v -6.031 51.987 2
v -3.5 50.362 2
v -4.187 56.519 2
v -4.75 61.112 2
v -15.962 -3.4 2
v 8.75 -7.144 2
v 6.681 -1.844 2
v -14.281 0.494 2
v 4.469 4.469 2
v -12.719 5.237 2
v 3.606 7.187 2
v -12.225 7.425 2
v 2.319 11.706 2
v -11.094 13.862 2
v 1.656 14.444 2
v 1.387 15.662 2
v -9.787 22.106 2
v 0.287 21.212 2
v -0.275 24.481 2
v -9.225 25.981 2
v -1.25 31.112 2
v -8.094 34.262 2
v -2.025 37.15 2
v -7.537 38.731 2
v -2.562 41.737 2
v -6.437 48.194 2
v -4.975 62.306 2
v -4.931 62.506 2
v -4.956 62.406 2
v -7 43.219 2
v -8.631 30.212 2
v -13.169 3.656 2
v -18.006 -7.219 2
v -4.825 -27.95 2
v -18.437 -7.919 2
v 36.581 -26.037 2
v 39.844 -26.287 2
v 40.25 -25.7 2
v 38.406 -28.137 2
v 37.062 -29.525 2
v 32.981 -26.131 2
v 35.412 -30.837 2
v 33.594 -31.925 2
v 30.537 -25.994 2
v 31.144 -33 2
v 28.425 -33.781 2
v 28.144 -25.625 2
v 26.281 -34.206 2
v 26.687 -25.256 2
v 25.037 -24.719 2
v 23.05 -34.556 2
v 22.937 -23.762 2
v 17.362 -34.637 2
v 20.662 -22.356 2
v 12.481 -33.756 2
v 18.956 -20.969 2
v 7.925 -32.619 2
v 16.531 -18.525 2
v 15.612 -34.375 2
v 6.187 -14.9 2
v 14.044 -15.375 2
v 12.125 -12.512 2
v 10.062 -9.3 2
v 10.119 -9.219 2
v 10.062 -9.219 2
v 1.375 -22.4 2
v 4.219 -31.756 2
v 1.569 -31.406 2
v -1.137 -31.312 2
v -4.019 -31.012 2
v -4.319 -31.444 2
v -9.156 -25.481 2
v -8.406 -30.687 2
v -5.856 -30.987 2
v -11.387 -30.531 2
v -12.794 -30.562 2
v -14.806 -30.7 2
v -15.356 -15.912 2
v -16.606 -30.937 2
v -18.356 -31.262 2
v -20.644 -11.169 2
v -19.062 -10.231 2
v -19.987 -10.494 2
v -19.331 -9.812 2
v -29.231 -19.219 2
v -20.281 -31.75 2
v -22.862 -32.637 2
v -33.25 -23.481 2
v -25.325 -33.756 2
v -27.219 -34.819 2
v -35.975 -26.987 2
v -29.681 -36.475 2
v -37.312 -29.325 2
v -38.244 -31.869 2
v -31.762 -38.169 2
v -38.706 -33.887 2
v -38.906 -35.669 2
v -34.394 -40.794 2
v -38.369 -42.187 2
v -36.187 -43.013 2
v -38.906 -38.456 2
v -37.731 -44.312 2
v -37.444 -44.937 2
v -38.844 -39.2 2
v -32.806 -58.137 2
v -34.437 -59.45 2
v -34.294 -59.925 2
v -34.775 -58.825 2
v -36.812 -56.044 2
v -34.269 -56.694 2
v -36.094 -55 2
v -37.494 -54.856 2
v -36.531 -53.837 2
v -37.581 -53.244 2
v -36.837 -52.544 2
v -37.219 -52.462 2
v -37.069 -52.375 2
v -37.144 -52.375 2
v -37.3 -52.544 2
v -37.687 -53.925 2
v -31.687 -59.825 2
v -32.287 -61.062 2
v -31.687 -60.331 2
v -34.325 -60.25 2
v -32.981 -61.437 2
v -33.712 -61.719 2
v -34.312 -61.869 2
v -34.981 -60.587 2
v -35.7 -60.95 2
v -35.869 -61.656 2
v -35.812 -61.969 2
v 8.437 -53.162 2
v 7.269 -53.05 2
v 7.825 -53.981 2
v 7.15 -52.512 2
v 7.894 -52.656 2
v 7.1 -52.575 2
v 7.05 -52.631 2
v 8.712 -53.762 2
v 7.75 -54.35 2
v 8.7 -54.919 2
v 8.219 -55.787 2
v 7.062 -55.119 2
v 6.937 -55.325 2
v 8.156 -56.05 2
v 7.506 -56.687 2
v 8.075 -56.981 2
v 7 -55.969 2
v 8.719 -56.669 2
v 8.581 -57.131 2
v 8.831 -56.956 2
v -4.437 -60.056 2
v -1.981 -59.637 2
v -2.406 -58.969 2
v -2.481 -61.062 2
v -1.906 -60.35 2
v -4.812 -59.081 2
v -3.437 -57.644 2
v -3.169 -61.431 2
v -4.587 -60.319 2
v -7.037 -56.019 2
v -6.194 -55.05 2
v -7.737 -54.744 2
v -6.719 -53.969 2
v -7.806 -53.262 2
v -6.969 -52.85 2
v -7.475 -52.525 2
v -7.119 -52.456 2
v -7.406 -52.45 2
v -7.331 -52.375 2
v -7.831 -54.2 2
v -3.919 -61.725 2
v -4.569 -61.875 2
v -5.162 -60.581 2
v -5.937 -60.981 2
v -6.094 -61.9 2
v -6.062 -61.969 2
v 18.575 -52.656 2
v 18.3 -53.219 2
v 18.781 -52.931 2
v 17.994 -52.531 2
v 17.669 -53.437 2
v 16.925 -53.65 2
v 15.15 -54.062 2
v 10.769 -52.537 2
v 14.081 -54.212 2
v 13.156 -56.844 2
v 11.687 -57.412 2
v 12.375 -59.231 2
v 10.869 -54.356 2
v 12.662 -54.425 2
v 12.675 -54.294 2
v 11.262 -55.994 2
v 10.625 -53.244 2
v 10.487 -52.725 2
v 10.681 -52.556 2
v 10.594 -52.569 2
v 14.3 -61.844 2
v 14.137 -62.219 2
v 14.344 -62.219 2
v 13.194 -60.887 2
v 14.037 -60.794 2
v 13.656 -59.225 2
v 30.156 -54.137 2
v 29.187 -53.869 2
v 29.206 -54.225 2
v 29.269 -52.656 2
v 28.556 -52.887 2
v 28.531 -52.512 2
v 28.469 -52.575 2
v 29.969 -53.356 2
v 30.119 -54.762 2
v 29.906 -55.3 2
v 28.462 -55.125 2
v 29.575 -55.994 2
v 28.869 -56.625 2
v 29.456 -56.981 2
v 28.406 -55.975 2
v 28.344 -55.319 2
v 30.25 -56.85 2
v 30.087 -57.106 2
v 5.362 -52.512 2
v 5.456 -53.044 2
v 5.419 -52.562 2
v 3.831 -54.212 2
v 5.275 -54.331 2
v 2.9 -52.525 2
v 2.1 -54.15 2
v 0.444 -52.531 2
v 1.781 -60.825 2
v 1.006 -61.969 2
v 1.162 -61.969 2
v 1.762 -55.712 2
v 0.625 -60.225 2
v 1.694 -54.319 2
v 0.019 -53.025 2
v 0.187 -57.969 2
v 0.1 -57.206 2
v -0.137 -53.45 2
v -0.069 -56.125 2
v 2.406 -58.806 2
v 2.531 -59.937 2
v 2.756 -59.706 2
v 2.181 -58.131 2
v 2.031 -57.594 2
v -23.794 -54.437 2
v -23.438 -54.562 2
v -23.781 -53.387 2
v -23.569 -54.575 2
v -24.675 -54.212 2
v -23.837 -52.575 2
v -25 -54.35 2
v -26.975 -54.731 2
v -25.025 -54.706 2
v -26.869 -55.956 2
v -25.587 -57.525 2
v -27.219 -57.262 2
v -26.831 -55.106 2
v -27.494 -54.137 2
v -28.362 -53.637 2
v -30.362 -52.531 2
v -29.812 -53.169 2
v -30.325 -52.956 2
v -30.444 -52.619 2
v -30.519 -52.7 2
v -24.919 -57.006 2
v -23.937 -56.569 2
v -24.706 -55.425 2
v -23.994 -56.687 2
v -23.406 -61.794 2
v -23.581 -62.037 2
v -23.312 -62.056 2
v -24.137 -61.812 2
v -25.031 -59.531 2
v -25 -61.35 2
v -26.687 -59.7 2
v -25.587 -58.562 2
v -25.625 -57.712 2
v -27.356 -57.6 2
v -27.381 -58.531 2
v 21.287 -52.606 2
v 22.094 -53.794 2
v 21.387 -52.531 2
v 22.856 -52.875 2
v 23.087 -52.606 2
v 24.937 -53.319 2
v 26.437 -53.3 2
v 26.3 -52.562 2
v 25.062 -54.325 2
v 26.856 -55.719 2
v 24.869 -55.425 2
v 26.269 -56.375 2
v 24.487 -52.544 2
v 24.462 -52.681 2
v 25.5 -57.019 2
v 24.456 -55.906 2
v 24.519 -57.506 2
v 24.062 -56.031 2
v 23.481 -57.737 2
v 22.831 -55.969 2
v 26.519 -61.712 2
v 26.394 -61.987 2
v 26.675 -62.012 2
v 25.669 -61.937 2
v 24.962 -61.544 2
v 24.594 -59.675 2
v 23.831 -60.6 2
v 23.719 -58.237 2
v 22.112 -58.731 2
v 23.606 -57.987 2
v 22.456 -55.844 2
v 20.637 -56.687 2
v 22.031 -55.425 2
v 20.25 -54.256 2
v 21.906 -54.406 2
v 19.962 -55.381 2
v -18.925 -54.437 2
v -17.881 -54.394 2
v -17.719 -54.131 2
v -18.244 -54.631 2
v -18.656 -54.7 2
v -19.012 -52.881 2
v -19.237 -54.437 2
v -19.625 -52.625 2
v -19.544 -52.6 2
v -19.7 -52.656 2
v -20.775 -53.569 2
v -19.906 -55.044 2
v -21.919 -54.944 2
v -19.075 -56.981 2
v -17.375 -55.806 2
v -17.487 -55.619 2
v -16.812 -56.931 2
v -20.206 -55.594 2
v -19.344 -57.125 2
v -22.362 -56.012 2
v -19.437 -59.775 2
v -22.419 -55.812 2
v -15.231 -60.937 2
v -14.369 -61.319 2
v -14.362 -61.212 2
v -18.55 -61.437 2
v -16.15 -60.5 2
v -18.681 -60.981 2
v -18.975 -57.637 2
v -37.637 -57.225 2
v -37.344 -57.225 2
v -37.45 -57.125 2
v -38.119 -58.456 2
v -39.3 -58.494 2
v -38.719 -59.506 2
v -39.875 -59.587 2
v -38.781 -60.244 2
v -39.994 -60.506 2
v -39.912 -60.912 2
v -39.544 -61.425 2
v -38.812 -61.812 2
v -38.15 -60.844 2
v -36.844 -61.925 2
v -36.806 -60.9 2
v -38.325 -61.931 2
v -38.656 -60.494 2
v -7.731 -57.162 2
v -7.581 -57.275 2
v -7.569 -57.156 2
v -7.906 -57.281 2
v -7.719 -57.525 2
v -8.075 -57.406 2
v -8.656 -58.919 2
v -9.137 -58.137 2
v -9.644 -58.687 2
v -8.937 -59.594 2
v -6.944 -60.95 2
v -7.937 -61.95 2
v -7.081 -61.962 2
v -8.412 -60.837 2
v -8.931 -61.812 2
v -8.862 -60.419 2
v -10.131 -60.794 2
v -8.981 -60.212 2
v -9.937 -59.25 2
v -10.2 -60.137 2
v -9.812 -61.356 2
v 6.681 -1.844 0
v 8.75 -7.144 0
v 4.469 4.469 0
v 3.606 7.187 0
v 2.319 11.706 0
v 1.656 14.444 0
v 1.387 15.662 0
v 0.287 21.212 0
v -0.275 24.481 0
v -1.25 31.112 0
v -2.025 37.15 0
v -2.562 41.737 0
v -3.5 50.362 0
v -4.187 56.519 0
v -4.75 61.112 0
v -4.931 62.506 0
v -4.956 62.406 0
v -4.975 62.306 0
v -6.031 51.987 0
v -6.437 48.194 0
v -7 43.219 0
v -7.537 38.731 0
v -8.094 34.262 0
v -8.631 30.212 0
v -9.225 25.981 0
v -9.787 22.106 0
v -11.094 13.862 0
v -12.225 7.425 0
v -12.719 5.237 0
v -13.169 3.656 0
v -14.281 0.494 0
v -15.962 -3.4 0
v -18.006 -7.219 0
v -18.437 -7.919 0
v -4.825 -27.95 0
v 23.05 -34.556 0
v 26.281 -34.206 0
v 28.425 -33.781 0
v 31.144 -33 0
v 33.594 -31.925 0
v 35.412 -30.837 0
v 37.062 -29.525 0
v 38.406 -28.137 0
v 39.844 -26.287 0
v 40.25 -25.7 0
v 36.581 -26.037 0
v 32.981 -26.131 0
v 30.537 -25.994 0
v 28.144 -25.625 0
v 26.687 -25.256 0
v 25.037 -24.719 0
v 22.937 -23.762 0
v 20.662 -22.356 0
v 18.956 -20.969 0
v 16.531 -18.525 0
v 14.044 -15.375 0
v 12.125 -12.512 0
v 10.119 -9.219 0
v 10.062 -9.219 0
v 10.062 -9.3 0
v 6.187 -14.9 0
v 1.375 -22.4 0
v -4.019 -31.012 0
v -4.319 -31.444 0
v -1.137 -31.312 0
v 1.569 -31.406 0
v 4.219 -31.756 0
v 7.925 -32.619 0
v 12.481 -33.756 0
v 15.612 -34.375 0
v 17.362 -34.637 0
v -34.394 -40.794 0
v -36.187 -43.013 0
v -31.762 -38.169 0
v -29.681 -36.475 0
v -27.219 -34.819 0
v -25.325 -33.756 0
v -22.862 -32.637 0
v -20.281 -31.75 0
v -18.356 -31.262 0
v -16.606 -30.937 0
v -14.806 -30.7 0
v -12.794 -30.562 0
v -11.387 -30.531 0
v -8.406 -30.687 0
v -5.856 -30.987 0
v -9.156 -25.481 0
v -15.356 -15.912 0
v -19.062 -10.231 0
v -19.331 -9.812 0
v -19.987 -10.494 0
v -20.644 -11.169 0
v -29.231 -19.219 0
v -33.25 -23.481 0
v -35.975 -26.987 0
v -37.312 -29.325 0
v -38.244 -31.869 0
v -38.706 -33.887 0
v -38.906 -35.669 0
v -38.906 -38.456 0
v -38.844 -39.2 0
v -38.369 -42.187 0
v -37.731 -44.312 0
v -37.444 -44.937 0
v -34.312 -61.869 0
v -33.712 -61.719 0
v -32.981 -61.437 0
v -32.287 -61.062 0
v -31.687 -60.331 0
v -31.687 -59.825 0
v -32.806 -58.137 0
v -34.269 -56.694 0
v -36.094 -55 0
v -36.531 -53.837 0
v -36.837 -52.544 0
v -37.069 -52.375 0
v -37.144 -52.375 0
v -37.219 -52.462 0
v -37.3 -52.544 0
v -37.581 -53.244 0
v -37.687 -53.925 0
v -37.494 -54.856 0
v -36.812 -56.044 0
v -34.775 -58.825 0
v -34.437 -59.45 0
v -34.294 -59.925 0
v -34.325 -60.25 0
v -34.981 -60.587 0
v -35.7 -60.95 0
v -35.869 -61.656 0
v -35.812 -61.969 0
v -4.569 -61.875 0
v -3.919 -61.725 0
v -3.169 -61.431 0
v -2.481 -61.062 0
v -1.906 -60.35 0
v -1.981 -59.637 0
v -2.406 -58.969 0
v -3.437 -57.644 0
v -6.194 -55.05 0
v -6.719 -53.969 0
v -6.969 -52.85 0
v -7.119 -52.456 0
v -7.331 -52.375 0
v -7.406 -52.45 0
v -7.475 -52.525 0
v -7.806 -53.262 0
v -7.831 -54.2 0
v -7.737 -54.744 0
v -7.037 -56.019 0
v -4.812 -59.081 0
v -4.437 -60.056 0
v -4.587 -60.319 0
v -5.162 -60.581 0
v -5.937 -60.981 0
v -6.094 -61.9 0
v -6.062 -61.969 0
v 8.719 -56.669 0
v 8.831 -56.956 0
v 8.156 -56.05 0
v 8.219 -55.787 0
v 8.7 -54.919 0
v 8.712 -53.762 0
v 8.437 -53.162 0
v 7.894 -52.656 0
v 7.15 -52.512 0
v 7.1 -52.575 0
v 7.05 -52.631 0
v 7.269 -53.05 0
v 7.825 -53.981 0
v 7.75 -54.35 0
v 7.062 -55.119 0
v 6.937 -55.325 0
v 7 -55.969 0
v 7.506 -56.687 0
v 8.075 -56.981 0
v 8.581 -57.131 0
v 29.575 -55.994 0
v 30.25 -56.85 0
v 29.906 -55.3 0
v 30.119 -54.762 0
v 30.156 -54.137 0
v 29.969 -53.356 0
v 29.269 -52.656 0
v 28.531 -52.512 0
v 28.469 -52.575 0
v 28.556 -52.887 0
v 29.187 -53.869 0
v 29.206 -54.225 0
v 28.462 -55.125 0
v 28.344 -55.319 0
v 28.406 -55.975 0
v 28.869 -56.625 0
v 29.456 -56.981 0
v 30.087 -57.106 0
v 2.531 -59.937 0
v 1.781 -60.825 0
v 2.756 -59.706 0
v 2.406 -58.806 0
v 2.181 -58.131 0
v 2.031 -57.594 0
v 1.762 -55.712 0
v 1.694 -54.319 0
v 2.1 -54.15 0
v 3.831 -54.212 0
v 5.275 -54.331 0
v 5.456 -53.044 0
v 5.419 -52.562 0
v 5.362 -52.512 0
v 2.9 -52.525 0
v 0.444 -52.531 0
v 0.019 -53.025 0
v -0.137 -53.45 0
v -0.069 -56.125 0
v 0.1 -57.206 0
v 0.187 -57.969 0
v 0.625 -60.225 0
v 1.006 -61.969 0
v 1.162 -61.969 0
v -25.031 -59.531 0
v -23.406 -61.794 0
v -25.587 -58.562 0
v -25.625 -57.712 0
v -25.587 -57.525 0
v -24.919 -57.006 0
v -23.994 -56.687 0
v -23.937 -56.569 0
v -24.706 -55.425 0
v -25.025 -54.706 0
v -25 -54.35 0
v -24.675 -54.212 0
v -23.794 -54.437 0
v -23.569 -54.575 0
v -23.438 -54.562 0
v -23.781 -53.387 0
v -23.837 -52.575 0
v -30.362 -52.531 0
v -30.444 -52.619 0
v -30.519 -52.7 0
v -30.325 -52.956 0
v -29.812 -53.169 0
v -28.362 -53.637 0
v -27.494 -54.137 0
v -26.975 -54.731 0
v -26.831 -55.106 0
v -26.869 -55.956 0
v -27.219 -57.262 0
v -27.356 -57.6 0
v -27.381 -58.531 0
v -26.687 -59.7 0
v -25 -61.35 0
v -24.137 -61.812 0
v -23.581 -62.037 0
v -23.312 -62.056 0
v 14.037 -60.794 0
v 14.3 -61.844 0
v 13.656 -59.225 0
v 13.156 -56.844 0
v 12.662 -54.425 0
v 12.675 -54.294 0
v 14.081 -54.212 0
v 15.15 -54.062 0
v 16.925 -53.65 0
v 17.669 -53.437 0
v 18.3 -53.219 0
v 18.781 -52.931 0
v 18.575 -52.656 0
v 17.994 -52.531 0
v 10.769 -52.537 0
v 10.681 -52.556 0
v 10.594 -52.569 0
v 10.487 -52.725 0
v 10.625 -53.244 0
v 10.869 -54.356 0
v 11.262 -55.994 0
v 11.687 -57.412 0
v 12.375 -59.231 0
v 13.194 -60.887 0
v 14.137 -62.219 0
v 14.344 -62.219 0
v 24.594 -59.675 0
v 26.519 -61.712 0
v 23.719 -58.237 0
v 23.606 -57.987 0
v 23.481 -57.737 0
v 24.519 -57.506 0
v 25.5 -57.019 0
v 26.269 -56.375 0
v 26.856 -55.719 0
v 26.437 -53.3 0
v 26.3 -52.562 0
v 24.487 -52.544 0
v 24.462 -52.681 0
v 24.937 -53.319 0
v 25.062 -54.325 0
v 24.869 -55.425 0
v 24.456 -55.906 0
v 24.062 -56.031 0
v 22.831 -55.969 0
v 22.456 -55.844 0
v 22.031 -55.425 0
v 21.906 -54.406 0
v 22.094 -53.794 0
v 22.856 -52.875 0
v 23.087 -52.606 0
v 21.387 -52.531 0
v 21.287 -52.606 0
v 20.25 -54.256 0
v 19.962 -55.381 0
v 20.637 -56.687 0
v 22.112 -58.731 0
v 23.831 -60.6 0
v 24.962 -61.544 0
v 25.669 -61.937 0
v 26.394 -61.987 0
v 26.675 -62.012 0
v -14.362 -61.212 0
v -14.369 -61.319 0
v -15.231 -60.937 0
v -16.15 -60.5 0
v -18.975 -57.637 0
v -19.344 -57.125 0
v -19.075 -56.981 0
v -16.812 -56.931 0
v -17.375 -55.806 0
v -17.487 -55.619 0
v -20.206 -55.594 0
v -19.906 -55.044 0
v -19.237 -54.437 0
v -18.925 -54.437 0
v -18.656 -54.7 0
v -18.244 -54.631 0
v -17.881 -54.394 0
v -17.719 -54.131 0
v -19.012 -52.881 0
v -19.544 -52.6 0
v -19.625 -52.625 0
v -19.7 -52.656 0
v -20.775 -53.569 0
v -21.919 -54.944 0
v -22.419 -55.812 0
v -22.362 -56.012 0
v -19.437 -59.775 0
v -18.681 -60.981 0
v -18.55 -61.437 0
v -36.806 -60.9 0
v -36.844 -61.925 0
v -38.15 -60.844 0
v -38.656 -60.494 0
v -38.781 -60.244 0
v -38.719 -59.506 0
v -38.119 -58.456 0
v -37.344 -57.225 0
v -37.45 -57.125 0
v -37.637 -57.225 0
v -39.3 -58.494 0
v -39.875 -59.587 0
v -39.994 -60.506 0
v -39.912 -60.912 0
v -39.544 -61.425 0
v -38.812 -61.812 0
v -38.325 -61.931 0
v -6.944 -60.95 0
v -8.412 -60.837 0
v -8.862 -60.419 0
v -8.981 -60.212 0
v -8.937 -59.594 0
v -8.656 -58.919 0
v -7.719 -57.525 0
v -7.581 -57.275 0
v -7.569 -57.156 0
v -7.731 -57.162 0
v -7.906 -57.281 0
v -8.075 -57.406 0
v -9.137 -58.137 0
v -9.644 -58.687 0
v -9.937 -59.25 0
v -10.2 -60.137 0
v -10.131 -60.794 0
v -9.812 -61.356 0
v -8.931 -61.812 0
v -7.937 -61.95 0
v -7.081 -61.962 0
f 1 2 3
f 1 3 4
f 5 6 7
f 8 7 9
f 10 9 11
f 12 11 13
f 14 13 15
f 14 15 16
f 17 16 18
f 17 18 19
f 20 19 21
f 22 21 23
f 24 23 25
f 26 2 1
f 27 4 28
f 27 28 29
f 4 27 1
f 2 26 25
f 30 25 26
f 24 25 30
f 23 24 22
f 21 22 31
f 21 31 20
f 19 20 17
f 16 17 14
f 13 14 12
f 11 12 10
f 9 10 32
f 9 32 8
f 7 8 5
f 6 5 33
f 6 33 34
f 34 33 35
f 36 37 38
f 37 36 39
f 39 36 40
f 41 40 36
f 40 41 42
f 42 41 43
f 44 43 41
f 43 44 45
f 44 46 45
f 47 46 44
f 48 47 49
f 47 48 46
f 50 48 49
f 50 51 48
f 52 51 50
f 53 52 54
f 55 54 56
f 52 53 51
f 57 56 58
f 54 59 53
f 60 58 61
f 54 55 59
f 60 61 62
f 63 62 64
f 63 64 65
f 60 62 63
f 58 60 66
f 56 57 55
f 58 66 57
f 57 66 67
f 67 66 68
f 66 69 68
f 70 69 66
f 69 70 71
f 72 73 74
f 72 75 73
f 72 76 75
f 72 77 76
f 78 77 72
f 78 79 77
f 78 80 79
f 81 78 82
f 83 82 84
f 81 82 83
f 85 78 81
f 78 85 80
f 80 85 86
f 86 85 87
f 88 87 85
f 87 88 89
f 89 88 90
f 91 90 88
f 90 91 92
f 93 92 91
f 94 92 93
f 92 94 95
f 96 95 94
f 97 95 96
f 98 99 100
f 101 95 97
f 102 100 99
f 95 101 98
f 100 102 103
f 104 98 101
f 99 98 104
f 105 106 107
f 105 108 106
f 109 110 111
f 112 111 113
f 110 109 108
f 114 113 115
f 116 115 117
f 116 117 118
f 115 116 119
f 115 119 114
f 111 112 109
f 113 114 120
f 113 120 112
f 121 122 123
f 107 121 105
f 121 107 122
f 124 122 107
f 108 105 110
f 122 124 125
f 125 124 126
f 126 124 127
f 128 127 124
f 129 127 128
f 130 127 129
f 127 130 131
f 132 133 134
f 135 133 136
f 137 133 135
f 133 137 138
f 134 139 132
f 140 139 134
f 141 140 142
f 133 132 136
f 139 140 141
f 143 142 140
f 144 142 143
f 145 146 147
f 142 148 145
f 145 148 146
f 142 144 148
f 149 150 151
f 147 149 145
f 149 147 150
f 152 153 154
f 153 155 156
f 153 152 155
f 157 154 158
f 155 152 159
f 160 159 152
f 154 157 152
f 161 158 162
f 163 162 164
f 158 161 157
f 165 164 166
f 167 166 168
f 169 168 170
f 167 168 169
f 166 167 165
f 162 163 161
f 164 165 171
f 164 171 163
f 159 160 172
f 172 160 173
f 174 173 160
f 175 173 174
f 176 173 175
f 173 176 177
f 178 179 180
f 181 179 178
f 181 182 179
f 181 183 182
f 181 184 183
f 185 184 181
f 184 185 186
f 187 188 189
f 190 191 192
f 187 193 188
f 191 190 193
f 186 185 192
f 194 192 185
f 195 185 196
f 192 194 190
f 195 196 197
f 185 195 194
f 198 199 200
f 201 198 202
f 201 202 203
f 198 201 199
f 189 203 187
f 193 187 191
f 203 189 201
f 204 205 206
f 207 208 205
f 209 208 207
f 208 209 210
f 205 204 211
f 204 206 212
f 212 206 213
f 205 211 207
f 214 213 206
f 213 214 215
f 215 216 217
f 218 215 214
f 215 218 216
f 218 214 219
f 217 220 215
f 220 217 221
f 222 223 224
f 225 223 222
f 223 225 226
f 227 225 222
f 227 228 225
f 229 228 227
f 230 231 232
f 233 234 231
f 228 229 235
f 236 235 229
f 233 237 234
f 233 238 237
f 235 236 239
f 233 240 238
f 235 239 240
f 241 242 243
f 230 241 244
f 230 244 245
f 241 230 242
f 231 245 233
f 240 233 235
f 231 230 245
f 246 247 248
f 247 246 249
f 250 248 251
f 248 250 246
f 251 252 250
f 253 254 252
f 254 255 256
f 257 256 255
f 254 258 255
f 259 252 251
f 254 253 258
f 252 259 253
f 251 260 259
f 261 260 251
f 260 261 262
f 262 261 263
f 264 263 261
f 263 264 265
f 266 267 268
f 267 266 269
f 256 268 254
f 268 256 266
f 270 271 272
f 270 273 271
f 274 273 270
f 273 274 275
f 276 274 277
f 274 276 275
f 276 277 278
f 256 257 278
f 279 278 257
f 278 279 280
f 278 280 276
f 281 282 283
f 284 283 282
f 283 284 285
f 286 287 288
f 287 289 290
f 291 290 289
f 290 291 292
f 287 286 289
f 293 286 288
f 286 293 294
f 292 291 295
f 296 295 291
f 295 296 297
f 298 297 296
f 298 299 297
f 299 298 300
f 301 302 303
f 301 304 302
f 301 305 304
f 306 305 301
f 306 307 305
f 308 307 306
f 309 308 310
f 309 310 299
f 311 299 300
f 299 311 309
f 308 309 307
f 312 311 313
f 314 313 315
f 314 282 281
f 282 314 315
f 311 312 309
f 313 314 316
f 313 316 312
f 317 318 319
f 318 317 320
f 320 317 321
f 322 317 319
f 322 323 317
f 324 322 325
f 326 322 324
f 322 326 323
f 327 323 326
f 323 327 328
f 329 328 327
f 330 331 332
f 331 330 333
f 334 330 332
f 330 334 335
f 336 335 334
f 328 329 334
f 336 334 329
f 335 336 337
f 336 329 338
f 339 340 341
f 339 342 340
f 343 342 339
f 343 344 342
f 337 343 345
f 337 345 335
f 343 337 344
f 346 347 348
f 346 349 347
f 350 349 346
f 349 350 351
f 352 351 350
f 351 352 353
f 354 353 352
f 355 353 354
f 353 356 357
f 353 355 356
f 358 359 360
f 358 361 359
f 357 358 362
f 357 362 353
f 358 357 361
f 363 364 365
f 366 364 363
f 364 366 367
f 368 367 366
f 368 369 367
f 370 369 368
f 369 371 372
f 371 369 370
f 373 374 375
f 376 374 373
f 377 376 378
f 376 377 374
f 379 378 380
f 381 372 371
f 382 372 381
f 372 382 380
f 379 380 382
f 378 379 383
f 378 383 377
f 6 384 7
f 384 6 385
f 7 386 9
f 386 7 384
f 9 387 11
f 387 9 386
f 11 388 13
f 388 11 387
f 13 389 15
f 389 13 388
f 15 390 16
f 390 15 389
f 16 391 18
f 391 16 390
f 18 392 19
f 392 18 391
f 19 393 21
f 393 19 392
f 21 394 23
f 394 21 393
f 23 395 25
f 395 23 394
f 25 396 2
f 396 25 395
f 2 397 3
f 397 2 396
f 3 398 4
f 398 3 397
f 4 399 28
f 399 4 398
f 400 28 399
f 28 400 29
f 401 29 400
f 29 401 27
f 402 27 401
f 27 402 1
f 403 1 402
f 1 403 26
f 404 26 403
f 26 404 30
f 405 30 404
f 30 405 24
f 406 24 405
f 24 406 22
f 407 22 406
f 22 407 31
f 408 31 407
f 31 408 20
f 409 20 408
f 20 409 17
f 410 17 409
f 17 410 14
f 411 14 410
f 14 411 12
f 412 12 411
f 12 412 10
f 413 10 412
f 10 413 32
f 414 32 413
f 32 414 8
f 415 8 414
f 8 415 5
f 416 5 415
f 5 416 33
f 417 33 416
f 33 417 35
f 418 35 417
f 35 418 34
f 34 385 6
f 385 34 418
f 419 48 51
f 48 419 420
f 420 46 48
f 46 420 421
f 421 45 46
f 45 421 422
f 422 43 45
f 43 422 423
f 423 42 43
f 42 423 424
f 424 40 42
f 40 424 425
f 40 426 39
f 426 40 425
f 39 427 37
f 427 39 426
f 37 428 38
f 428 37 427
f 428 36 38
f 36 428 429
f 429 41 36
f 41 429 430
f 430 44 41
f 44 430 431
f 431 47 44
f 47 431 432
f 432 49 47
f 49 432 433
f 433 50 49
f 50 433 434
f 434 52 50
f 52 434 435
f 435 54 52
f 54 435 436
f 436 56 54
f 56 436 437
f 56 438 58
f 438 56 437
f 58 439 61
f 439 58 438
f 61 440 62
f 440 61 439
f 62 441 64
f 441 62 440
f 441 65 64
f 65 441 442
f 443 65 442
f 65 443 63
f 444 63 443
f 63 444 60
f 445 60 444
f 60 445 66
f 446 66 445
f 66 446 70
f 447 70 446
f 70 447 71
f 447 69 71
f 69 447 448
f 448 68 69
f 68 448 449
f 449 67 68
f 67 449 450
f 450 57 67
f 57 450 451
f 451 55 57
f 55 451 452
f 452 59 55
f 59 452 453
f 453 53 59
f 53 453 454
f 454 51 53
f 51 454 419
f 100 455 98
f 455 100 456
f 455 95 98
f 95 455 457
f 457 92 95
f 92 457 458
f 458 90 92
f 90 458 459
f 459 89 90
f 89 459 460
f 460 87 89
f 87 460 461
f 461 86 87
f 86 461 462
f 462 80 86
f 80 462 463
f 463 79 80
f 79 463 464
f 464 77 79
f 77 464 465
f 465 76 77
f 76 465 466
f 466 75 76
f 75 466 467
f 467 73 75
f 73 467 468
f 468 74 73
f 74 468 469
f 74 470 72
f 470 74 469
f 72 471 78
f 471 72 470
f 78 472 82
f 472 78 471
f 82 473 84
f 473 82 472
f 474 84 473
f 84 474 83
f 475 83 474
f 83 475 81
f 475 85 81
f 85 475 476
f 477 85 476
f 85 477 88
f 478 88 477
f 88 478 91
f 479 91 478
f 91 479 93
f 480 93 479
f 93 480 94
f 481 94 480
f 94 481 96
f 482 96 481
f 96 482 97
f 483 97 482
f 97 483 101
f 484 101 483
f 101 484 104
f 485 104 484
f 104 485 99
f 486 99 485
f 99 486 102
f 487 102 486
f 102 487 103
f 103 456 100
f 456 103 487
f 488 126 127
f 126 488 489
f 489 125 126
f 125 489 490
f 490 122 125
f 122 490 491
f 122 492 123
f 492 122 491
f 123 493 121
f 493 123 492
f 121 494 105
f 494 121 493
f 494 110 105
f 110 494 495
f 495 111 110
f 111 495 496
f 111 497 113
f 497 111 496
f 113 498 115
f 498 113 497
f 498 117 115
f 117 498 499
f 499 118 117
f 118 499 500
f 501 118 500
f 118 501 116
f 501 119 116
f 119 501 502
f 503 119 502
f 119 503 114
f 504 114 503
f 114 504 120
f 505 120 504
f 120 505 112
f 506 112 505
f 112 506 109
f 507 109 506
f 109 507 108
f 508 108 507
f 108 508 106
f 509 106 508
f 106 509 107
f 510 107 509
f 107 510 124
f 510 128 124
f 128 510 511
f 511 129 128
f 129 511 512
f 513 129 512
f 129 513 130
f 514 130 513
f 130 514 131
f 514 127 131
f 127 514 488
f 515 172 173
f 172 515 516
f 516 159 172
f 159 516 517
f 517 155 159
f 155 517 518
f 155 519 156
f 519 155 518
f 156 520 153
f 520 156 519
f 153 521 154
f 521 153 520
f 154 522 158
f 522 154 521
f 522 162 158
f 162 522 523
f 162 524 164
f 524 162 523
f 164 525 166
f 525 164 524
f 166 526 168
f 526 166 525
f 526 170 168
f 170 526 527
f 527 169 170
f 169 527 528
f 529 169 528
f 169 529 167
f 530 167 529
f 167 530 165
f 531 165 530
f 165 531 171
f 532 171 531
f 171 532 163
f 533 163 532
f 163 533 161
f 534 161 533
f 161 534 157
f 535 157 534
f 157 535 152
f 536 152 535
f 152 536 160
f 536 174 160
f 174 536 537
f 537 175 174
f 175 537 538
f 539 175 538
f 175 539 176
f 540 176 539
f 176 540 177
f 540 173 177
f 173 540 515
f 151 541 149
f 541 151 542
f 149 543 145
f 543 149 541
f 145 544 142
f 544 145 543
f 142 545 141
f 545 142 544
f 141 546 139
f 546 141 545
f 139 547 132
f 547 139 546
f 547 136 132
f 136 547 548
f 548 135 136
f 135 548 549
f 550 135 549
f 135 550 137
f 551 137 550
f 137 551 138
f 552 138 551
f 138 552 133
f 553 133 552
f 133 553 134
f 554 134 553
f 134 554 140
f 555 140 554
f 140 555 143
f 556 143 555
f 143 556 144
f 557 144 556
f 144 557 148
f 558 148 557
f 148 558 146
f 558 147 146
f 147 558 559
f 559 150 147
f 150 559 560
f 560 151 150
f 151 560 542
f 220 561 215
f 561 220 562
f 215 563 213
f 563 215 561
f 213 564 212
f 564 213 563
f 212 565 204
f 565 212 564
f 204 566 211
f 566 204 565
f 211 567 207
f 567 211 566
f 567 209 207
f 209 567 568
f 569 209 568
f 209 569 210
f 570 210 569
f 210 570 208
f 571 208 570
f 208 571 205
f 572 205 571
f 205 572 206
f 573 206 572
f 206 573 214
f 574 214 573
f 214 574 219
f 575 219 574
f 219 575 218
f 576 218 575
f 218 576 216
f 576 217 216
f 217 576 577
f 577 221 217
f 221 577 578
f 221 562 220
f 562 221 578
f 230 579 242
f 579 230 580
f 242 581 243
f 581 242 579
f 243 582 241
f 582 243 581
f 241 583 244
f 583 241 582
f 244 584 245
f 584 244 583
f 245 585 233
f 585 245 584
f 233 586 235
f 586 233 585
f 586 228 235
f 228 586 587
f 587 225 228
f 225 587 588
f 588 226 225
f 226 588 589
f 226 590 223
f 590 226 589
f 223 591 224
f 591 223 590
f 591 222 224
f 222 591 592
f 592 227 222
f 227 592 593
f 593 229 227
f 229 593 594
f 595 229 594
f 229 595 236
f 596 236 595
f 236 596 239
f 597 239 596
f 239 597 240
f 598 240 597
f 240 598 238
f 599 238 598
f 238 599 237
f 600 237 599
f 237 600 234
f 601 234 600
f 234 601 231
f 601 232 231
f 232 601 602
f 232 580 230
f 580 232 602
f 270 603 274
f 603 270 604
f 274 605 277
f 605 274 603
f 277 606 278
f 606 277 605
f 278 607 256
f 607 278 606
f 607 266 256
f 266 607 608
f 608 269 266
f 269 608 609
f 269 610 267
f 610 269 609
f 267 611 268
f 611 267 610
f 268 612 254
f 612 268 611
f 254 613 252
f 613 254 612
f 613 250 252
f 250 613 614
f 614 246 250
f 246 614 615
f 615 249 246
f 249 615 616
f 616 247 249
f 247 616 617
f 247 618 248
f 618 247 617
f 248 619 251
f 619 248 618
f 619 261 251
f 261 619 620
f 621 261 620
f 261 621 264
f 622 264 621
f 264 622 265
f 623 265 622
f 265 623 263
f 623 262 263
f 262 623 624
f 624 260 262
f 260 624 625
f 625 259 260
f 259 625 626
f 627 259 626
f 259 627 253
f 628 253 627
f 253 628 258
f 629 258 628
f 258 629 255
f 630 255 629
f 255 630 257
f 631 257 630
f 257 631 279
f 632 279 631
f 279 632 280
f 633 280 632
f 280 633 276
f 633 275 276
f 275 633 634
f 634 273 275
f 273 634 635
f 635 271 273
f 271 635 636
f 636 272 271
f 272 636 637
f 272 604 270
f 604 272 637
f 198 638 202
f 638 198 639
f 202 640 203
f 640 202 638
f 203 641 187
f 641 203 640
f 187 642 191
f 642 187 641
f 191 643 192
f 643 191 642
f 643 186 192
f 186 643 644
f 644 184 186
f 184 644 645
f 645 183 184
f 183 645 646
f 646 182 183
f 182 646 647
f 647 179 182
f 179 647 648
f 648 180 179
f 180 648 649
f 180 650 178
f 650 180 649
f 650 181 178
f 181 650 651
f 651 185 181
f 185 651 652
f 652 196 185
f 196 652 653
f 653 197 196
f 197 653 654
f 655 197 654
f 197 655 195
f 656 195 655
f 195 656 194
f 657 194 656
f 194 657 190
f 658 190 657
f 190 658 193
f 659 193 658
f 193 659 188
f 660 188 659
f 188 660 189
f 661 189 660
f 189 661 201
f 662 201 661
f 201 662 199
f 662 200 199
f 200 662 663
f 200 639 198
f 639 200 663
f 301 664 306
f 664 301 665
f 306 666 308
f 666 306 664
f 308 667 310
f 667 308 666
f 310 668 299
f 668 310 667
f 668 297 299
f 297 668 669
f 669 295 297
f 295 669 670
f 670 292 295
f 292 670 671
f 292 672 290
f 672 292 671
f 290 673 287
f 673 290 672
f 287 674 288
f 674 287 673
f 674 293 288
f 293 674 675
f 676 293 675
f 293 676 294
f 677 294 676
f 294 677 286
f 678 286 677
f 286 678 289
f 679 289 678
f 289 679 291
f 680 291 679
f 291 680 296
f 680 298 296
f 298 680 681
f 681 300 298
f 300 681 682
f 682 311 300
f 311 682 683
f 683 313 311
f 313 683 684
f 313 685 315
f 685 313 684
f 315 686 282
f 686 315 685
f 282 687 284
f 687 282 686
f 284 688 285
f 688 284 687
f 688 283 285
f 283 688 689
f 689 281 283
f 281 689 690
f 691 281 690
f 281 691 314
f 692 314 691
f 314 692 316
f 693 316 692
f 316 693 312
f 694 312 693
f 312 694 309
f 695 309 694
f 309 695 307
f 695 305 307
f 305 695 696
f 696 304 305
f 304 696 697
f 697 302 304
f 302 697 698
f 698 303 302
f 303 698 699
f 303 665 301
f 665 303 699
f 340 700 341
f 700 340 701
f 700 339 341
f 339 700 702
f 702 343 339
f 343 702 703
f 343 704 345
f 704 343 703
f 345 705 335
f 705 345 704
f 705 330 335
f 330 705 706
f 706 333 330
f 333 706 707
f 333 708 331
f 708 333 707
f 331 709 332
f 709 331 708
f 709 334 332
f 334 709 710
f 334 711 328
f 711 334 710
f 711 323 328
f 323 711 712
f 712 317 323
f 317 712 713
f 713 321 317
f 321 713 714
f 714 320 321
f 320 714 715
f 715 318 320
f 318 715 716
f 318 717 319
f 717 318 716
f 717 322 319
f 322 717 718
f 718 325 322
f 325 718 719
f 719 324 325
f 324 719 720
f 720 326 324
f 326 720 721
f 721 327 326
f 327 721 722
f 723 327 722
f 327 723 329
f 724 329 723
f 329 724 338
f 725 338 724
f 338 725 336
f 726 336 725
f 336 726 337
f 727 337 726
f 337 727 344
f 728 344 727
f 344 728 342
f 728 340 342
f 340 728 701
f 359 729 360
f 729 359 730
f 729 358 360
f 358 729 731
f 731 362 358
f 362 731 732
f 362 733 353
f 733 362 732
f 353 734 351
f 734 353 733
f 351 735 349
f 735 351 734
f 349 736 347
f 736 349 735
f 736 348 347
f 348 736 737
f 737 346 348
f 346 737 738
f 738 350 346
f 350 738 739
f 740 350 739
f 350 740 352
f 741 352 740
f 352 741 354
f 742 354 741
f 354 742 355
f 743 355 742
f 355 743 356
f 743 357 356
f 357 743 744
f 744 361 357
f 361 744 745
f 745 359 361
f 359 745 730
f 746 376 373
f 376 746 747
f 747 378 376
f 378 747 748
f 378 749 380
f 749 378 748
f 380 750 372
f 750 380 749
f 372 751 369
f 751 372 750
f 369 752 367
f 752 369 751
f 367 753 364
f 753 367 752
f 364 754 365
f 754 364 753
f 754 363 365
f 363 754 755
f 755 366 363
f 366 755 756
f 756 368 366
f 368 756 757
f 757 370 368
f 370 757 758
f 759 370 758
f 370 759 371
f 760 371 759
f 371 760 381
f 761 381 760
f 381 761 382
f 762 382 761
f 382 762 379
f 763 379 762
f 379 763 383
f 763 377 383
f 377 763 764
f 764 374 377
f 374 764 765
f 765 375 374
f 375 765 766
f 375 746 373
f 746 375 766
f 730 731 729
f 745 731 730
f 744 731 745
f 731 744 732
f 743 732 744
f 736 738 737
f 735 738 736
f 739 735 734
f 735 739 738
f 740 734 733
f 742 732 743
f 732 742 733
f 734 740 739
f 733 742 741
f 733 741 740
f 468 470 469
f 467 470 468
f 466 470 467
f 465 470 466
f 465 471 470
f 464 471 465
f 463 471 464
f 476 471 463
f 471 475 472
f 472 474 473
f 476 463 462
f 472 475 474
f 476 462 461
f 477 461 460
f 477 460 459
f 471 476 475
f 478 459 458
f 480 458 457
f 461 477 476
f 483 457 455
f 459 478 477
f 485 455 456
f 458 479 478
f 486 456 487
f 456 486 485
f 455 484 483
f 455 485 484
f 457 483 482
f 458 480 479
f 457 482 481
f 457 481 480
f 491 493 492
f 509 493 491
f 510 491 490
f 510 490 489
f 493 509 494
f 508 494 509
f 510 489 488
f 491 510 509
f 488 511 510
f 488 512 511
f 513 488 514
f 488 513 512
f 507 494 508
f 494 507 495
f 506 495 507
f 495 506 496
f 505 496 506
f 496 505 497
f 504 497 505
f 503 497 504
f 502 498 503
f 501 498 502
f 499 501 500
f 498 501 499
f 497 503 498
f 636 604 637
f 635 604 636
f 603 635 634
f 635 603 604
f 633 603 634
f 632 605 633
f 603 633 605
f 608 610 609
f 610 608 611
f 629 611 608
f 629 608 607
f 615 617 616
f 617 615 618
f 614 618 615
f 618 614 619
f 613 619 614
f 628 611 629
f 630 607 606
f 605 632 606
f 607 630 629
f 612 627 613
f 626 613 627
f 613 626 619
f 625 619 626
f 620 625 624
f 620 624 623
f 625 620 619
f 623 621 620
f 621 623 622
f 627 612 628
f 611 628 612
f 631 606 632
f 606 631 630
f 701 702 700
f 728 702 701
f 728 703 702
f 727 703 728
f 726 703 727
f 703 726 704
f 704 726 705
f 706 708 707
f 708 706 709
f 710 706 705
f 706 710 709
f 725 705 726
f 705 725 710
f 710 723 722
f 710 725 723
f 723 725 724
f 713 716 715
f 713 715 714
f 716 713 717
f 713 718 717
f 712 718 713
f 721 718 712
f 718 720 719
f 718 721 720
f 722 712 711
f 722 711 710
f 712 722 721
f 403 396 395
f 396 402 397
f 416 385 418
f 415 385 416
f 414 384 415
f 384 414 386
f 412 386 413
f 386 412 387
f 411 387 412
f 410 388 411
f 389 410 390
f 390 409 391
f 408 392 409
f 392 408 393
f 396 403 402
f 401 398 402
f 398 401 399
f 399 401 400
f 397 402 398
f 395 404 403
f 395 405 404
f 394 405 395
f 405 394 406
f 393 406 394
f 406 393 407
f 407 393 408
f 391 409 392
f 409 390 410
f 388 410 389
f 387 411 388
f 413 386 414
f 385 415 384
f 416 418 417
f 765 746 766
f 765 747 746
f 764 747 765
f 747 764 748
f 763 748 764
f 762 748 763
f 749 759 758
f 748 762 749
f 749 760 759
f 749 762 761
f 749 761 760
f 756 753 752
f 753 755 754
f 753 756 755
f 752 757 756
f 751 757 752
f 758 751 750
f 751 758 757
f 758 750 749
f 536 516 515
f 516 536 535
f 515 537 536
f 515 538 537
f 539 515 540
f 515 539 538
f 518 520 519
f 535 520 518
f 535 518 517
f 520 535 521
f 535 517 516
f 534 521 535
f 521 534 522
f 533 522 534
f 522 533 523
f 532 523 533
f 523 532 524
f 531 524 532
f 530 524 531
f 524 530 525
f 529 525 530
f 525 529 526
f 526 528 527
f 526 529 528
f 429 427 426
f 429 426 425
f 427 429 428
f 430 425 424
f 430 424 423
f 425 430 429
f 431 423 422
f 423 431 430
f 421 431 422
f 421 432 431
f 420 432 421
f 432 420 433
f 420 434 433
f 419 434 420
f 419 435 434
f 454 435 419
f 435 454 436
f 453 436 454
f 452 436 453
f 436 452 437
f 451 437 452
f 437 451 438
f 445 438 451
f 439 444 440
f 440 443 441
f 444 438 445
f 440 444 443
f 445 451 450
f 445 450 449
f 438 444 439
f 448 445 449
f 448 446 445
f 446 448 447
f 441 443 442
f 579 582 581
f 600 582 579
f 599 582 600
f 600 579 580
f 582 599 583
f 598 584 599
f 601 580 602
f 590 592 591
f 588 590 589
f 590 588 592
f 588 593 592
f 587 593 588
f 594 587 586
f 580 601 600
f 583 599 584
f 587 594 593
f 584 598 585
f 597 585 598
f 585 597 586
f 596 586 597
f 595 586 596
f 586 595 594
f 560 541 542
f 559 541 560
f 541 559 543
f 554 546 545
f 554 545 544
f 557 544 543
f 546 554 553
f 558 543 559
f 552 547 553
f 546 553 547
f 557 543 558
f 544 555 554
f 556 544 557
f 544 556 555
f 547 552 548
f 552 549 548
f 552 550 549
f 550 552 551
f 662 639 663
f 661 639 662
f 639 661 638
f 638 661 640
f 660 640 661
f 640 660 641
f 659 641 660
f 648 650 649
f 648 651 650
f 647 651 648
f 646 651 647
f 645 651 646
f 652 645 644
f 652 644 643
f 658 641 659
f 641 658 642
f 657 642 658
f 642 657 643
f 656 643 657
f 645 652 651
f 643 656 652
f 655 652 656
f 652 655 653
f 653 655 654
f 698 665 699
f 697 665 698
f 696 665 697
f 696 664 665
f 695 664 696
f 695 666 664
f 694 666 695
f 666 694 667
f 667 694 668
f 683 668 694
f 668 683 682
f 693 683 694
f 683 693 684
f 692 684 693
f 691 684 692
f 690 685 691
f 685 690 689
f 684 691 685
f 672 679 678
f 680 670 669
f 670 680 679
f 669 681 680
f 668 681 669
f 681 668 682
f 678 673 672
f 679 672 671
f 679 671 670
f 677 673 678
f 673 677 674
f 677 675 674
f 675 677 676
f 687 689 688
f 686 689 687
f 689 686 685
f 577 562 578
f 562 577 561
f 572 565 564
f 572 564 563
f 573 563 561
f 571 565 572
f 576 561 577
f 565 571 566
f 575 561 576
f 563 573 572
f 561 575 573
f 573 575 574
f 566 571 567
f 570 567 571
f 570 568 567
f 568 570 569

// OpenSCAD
module 975d99e302ef3498b8c9089061652986_1()
{
 /* Generated by trace2scad version 20150415
    http://aggregate.org/MAKE/TRACE2SCAD/
    Optimized model has 387/4796 original points
 */
 color([0.48, 0.48, 0.48])
 assign(minx=0) /* polygon minx=39 */
 assign(miny=0) /* polygon miny=45 */
 assign(maxx=12880) /* polygon maxx=12880 */
 assign(maxy=20000) /* polygon maxy=20001 */
 assign(dx=maxx-minx)
 assign(dy=maxy-miny)
 assign(maxd=((dx>dy)?dx:dy))
 scale([1/maxd, 1/maxd, 1])
 translate([-minx-dx/2, -miny-dy/2, 0])
 linear_extrude(height=1, convexity=387)
 union() {
  union() {
   polygon([[5647,19985],[5644,19969],[5475,18318],[5410,17711],[5320,16915],[5234,16197],[5145,15482],[5059,14834],[4964,14157],[4874,13537],[4665,12218],[4484,11188],[4405,10838],[4333,10585],[4155,10079],[3886,9456],[3559,8845],[3490,8733],[5668,5528],[7840,8857],[7509,9705],[7155,10715],[7017,11150],[6811,11873],[6705,12311],[6662,12506],[6486,13394],[6396,13917],[6240,14978],[6116,15944],[6030,16678],[5880,18058],[5770,19043],[5680,19778],[5651,20001]], convexity=6);
   polygon([[8050,8518],[8050,8512],[7430,7616],[6660,6416],[5797,5038],[5749,4969],[6258,4990],[6691,4975],[7115,4919],[7708,4781],[8437,4599],[8938,4500],[9218,4458],[10128,4471],[10645,4527],[10988,4595],[11423,4720],[11815,4892],[12106,5066],[12370,5276],[12585,5498],[12815,5794],[12880,5888],[12293,5834],[11717,5819],[11326,5841],[10943,5900],[10710,5959],[10446,6045],[10110,6198],[9746,6423],[9473,6645],[9085,7036],[8687,7540],[8380,7998],[8059,8525],[8050,8525]], convexity=9);
   polygon([[3242,8321],[3137,8213],[1763,6925],[1120,6243],[684,5682],[470,5308],[321,4901],[247,4578],[215,4293],[215,3847],[225,3728],[301,3250],[403,2910],[449,2810],[650,3118],[937,3473],[1358,3893],[1691,4164],[2085,4429],[2388,4599],[2782,4778],[3195,4920],[3503,4998],[3783,5050],[4071,5088],[4393,5110],[4618,5115],[5095,5090],[5503,5042],[4975,5923],[3983,7454],[3390,8363],[3347,8430]], convexity=7);
   polygon([[485,1606],[472,1593],[427,1481],[410,1372],[441,1223],[550,1033],[876,588],[930,488],[953,412],[948,360],[843,306],[728,248],[701,135],[710,85],[950,101],[1046,125],[1163,170],[1274,230],[1370,347],[1370,428],[1191,698],[957,929],[665,1200],[595,1386],[546,1593],[509,1620],[497,1620]], convexity=8);
   polygon([[5255,1608],[5244,1596],[5191,1478],[5187,1328],[5202,1241],[5314,1037],[5670,547],[5730,391],[5706,349],[5614,307],[5490,243],[5465,96],[5470,85],[5709,100],[5813,124],[5933,171],[6043,230],[6135,344],[6123,458],[6055,565],[5890,777],[5449,1192],[5365,1365],[5325,1544],[5301,1607],[5267,1620]], convexity=8);
   polygon([[6904,1596],[6511,1595],[6443,1516],[6418,1448],[6429,1020],[6456,847],[6470,725],[6540,364],[6601,85],[6626,85],[6725,268],[6845,410],[6881,447],[6825,591],[6789,699],[6765,785],[6722,1086],[6711,1309],[6776,1336],[7053,1326],[7284,1307],[7313,1513],[7307,1590],[7298,1598]], convexity=10);
   polygon([[7576,1588],[7568,1579],[7603,1512],[7692,1363],[7680,1304],[7570,1181],[7550,1148],[7560,1045],[7641,930],[7732,883],[7813,859],[7853,887],[7835,933],[7745,1032],[7755,1074],[7832,1213],[7834,1398],[7790,1494],[7703,1575],[7584,1598]], convexity=10);
   polygon([[11000,1593],[10995,1588],[11009,1538],[11110,1381],[11113,1324],[10994,1180],[10975,1149],[10985,1044],[11059,940],[11153,883],[11254,863],[11280,904],[11172,1041],[11225,1152],[11259,1238],[11265,1338],[11235,1463],[11123,1575],[11005,1598]], convexity=10);
   polygon([[1569,1581],[1557,1568],[1588,1527],[1670,1493],[1902,1418],[2041,1338],[2124,1243],[2147,1183],[2141,1047],[2085,838],[2063,784],[2059,635],[2170,448],[2440,184],[2578,110],[2667,74],[2710,71],[2695,113],[2435,475],[2346,630],[2340,766],[2346,796],[2453,879],[2601,930],[2610,949],[2487,1132],[2436,1247],[2440,1304],[2492,1326],[2633,1290],[2669,1268],[2690,1270],[2635,1458],[2626,1588],[1582,1595]], convexity=13);
   polygon([[8149,1591],[8135,1589],[8118,1564],[8140,1481],[8179,1303],[8242,1041],[8310,814],[8420,523],[8551,258],[8702,45],[8735,45],[8728,105],[8686,273],[8625,524],[8545,905],[8466,1292],[8468,1313],[8693,1326],[8864,1350],[9148,1416],[9267,1450],[9368,1485],[9445,1531],[9412,1575],[9319,1595],[8163,1594]], convexity=9);
   polygon([[9854,1589],[9846,1583],[9680,1319],[9634,1139],[9742,930],[9978,603],[10253,304],[10434,153],[10547,90],[10663,82],[10708,78],[10683,126],[10375,452],[10235,682],[10217,722],[10197,762],[10363,799],[10520,877],[10643,980],[10737,1085],[10670,1472],[10648,1590],[10358,1593],[10354,1571],[10430,1469],[10450,1308],[10419,1132],[10353,1055],[10290,1035],[10093,1045],[10033,1065],[9965,1132],[9945,1295],[9975,1393],[10097,1540],[10134,1583],[9862,1595]], convexity=13);
   polygon([[3300,1580],[3288,1575],[3116,1429],[2933,1209],[2853,1070],[2862,1038],[3330,436],[3451,243],[3472,170],[4141,189],[4142,206],[4003,250],[3856,320],[3404,778],[3345,860],[3388,883],[3750,891],[3660,1071],[3642,1101],[3207,1105],[3255,1193],[3362,1290],[3412,1290],[3455,1248],[3521,1259],[3579,1297],[3605,1339],[3398,1539],[3313,1584]], convexity=12);
   polygon([[433,852],[418,844],[152,641],[60,466],[41,319],[54,254],[113,172],[230,110],[308,91],[545,92],[551,256],[336,265],[255,321],[235,361],[245,479],[341,647],[465,844],[448,860]], convexity=8);
   polygon([[5175,835],[5148,815],[4978,698],[4897,610],[4850,520],[4808,378],[4819,273],[4870,183],[5011,110],[5170,88],[5307,86],[5329,248],[5094,266],[5022,333],[5003,366],[5010,465],[5055,573],[5205,796],[5227,836],[5229,855],[5203,854]], convexity=8);
  }
 }
}

module 975d99e302ef3498b8c9089061652986()
{
 /* all layers combined, scaled to within a 1mm cube */
 scale([1, 1, 1/1])
 difference() {
  union() {
   scale([1,1,2]) translate([0,0,-0.5]) 975d99e302ef3498b8c9089061652986_1();
  }
  translate([0,0,-2]) cube([2,2,4],center=true);
 }
}

scale([125, 125, 2]) {
	975d99e302ef3498b8c9089061652986();
}
